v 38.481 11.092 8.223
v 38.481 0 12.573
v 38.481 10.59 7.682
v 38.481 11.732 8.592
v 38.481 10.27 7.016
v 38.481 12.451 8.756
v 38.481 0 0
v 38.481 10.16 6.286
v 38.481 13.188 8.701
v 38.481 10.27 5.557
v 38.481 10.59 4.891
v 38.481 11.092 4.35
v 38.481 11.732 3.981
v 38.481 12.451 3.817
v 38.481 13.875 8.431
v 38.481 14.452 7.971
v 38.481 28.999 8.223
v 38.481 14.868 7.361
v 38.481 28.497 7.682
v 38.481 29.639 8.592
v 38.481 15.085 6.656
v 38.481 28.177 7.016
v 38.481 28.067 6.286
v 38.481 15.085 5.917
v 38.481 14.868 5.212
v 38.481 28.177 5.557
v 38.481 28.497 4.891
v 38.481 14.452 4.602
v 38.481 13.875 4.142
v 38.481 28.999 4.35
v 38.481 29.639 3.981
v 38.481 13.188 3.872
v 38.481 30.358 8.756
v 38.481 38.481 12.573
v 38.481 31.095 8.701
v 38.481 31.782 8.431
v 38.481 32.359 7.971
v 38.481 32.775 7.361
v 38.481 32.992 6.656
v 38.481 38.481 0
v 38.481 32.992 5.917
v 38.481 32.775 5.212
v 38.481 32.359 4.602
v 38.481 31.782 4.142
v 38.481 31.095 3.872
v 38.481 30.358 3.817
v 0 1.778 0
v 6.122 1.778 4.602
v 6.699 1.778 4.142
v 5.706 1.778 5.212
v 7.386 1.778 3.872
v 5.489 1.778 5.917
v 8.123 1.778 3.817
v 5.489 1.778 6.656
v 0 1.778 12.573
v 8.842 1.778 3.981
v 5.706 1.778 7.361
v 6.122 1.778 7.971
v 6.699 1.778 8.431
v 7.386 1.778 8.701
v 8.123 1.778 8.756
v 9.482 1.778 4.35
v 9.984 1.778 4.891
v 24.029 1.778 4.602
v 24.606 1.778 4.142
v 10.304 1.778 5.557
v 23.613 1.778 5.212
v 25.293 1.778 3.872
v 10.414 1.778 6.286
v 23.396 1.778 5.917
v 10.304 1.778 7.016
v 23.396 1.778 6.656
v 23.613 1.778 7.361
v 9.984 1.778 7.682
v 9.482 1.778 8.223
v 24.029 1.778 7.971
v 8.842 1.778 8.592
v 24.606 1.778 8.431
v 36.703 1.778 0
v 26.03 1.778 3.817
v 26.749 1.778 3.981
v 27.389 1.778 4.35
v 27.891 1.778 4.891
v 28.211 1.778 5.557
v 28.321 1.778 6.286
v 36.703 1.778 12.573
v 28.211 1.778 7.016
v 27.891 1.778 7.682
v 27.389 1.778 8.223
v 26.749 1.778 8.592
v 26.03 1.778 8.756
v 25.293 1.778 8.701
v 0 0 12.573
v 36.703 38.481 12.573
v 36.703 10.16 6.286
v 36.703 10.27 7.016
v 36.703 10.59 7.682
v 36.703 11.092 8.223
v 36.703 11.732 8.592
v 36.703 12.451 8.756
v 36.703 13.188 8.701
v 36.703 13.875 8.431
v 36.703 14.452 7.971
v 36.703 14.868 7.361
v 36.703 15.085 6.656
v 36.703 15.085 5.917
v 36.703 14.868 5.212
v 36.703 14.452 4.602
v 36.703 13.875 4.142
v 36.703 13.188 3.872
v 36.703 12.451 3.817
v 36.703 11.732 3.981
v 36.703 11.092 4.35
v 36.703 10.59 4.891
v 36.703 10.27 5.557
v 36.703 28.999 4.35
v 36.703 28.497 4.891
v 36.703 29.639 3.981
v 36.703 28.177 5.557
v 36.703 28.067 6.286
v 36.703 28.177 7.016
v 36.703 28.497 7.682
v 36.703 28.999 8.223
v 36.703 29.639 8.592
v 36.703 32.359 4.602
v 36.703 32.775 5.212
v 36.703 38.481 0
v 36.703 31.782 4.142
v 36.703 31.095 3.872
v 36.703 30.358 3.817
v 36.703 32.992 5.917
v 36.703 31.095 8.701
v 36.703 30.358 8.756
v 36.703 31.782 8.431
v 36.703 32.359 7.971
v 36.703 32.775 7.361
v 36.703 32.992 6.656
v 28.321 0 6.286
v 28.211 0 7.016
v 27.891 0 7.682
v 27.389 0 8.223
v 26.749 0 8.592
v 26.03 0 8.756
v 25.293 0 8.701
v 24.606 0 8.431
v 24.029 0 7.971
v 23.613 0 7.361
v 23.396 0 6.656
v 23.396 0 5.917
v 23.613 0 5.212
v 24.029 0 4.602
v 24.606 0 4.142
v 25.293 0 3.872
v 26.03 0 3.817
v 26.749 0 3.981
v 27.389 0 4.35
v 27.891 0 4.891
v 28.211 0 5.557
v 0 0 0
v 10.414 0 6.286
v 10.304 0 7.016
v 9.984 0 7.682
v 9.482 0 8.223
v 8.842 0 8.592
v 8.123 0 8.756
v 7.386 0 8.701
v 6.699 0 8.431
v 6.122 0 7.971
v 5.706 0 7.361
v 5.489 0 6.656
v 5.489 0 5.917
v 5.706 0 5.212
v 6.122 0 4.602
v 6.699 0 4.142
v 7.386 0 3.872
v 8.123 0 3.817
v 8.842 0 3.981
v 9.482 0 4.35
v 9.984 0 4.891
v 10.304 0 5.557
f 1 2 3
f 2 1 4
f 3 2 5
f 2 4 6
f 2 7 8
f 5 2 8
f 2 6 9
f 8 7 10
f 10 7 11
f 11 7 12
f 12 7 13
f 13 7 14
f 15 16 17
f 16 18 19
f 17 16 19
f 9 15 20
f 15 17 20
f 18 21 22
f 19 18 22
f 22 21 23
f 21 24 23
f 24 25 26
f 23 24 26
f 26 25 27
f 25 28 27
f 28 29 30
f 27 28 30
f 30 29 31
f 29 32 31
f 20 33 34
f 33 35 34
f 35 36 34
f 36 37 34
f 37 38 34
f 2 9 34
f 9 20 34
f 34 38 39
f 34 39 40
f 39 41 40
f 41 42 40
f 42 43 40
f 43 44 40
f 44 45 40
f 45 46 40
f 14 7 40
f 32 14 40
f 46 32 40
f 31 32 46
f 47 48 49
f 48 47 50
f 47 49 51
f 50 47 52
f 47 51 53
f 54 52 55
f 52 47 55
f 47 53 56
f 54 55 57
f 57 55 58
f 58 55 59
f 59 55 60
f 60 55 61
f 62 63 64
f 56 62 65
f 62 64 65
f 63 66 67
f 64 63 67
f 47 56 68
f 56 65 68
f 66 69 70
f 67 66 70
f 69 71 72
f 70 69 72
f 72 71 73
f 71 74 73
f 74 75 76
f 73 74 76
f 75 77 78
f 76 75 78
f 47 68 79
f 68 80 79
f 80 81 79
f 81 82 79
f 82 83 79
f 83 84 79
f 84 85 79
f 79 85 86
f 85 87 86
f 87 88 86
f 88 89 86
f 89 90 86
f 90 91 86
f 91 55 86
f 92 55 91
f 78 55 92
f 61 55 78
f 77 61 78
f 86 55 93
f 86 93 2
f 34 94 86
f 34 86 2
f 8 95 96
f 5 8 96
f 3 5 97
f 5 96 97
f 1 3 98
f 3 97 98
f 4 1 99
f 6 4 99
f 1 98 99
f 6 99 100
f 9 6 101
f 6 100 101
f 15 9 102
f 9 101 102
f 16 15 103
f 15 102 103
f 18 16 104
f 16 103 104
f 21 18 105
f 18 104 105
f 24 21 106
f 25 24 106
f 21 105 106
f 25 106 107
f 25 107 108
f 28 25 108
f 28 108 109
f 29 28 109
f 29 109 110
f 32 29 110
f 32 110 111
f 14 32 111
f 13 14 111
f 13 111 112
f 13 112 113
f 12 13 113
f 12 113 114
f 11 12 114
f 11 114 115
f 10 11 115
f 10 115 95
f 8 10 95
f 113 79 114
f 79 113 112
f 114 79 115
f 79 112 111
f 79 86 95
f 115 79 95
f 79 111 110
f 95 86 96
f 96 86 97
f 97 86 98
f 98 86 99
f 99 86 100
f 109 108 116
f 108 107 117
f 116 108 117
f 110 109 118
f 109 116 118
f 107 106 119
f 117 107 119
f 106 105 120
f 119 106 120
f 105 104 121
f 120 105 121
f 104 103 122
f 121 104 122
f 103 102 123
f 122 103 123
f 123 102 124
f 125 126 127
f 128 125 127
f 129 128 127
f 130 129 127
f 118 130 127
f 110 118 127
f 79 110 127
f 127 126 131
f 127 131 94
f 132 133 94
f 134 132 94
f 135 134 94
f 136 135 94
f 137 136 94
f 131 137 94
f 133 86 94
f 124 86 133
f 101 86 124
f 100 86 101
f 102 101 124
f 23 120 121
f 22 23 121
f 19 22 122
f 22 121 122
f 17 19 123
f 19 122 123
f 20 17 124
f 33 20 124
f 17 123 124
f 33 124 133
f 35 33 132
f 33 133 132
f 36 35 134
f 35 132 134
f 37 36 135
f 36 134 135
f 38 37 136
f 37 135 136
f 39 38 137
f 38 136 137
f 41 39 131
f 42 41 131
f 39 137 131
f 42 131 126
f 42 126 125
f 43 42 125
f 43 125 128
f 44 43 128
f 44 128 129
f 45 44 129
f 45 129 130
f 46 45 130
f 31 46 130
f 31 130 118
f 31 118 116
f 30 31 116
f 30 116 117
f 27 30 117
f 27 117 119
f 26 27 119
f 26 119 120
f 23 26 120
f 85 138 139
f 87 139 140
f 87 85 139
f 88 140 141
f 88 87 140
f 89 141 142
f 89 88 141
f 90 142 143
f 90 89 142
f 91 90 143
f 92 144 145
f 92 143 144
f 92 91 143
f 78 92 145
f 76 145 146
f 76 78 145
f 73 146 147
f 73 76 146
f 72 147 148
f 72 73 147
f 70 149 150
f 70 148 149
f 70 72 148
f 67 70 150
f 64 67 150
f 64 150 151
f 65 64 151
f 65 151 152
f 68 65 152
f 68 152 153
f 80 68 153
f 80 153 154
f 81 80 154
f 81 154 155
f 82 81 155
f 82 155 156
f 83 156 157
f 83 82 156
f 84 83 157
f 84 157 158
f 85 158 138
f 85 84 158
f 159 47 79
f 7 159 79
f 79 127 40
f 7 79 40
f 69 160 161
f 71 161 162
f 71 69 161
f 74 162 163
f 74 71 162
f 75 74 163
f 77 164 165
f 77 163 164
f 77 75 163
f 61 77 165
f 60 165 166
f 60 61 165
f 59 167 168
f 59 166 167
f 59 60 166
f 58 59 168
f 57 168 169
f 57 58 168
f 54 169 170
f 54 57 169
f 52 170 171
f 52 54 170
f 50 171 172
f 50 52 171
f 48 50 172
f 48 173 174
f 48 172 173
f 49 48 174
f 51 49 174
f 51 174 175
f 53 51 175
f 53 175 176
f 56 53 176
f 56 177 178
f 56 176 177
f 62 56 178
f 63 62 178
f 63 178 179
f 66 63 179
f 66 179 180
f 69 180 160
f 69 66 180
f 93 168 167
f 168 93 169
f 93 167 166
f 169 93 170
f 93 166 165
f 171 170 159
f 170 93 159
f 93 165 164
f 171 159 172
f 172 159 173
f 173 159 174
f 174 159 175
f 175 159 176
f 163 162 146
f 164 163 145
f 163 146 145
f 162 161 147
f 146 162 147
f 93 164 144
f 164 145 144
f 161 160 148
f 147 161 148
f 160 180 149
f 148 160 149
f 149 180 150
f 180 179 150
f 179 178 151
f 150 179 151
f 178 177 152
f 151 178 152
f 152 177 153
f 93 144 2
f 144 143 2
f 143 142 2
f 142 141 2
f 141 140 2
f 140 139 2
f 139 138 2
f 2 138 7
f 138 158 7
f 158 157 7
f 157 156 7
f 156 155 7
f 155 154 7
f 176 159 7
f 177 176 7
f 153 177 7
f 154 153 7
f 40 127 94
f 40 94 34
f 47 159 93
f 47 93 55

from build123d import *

# Parameters (mm, degrees)
SKETCH1_W           = 38.481
SKETCH1_H           = 38.481
BOSS_EXTRUDE1_DEPTH = 12.573
SKETCH2_W           = 36.703
SKETCH2_H           = 36.703
CUT_EXTRUDE1_DEPTH  = 56.853872301
SKETCH3_R           = 2.4765
CUT_EXTRUDE2_DEPTH  = 55.644102143


with BuildPart() as part:
    # Sketch1 → Boss-Extrude1 (new body)
    with BuildSketch(Plane.XY):
        with Locations((19.2405, 19.2405)):
            Rectangle(SKETCH1_W, SKETCH1_H)
    extrude(amount=BOSS_EXTRUDE1_DEPTH)

    # Sketch2 → Cut-Extrude1 (cut, through all)
    with BuildSketch(Plane.XY.offset(12.573)):
        with Locations((18.3515, 20.1295)):
            Rectangle(SKETCH2_W, SKETCH2_H)
    extrude(amount=-CUT_EXTRUDE1_DEPTH, mode=Mode.SUBTRACT)

    # Sketch3 → Cut-Extrude2 (cut, through all)
    with BuildSketch(Plane.ZY.offset(-36.703)):
        with Locations(Location((6.2865, 12.6365, 0), (0, 0, 270))):
            Circle(SKETCH3_R)
        with Locations(Location((6.2865, 30.5435, 0), (0, 0, 270))):
            Circle(SKETCH3_R)
    cut_extrude2 = extrude(amount=-CUT_EXTRUDE2_DEPTH, mode=Mode.SUBTRACT)

    # Mirror1: Cut-Extrude2 across plane
    add(cut_extrude2.mirror(Plane(origin=(19.2405, 19.2405, 0), x_dir=(0, 0, 1), z_dir=(0.7071067811865389, 0.7071067811865561, 0))), mode=Mode.SUBTRACT)


solid = part.part
